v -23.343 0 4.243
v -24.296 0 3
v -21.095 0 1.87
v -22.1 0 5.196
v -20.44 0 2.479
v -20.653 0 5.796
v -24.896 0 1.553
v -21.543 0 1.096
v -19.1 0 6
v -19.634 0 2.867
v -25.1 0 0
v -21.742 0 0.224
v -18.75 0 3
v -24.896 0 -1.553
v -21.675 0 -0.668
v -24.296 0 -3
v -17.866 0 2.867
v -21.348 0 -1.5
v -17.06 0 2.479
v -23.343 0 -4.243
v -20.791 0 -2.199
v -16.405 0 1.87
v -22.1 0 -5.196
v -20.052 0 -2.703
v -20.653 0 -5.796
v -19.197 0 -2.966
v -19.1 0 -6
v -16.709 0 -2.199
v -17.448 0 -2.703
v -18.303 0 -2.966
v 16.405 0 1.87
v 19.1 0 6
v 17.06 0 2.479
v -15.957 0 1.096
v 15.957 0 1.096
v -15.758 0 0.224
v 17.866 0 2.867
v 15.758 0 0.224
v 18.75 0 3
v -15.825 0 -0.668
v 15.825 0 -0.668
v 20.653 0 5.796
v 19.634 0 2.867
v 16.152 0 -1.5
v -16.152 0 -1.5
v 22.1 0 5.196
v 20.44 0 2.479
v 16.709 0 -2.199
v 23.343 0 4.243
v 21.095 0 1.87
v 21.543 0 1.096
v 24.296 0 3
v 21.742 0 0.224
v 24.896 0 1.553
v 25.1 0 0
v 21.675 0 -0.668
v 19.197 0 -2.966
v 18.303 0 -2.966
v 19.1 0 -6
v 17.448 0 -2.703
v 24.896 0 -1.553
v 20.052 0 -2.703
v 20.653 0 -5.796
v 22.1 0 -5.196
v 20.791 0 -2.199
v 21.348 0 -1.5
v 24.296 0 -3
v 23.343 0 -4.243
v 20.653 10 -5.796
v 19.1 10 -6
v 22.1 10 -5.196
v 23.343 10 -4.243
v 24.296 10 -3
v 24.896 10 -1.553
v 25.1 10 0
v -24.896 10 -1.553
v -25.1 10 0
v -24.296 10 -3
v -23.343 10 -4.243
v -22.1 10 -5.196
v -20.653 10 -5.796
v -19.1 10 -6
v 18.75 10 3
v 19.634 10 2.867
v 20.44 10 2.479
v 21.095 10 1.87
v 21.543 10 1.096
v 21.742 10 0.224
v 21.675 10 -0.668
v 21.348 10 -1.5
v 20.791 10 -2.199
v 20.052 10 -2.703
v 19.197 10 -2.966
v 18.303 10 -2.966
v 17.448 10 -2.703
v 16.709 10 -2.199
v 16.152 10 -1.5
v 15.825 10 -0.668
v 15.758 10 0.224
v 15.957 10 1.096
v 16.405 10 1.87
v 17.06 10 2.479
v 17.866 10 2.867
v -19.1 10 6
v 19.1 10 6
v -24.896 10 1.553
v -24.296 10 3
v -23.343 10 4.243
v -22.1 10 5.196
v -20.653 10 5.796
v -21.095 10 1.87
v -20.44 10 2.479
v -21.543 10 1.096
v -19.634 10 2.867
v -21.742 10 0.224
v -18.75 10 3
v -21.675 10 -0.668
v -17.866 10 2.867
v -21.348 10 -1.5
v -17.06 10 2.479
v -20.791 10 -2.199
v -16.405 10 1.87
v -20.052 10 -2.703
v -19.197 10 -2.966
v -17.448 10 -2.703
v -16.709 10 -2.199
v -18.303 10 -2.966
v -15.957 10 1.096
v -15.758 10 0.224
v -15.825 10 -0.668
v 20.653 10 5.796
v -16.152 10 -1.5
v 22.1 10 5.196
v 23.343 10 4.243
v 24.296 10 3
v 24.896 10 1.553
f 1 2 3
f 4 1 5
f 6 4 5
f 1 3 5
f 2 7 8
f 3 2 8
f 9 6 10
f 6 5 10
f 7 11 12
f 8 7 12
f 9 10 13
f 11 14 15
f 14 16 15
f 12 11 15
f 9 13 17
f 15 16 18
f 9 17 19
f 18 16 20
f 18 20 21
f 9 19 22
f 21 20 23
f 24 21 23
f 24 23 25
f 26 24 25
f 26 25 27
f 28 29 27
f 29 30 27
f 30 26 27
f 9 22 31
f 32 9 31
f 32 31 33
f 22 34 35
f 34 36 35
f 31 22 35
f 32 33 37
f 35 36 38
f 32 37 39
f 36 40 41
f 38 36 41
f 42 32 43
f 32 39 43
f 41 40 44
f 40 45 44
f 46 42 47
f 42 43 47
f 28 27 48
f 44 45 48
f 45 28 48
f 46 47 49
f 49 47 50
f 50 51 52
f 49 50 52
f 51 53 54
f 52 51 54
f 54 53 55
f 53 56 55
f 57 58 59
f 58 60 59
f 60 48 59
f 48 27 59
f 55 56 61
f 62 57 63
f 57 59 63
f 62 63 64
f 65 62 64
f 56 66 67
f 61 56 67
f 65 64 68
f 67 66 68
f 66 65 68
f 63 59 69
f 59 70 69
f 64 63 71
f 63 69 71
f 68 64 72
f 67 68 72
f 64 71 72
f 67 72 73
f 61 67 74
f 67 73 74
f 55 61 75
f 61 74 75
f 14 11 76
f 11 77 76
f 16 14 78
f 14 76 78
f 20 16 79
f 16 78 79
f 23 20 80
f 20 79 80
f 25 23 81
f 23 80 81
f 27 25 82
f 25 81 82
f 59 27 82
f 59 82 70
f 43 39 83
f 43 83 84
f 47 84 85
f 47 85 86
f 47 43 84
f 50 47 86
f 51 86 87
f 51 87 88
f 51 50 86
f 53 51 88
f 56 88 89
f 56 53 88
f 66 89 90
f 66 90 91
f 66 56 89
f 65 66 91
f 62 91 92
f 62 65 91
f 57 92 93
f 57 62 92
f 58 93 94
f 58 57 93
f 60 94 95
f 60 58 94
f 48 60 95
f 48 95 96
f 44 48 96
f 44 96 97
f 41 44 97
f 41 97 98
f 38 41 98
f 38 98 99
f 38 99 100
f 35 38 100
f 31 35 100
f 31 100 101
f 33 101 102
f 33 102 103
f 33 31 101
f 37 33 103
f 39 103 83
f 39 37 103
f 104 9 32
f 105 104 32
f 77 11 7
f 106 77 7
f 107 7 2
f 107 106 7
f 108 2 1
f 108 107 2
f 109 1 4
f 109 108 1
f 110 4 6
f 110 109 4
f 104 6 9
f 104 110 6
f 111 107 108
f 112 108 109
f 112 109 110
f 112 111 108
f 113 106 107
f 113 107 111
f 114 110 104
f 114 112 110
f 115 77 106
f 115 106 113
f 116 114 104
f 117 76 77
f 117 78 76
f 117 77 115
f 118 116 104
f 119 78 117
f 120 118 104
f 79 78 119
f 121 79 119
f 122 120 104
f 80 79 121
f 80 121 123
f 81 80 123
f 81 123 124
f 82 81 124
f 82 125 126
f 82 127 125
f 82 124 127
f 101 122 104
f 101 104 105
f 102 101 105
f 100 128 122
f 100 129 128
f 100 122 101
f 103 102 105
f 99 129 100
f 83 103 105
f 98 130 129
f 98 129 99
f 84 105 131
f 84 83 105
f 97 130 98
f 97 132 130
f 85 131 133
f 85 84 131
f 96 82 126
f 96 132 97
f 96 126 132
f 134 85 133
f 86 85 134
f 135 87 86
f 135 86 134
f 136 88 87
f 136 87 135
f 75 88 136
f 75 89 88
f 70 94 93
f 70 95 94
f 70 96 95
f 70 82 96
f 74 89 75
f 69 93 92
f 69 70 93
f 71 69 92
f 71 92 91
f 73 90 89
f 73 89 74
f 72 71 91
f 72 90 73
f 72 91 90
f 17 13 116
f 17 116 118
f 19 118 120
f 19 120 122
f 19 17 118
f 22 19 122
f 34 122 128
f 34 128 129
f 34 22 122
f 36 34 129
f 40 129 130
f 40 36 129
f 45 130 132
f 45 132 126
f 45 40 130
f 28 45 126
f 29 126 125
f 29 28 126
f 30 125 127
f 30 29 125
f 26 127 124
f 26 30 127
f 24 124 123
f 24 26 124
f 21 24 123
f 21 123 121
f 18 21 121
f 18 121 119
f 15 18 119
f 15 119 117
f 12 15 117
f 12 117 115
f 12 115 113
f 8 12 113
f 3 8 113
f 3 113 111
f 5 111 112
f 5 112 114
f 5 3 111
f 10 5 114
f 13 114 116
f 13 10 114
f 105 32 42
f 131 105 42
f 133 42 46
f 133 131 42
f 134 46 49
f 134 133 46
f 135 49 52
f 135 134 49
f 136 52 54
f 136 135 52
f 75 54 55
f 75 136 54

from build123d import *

# Parameters (mm, degrees)
SKETCH1_W           = 50.2
SKETCH1_H           = 12
SKETCH1_R           = 3
BOSS_EXTRUDE1_DEPTH = 10
FILLET1_R           = 6


with BuildPart() as part:
    # Sketch1 → Boss-Extrude1 (new body)
    with BuildSketch(Plane(origin=(0, 0, 0), x_dir=(1, 0, 0), z_dir=(0, 1, 0))):
        Rectangle(SKETCH1_W, SKETCH1_H)
        with Locations(Location((18.75, 0, 0), (0, 0, 270))):
            Circle(SKETCH1_R, mode=Mode.SUBTRACT)
        with Locations(Location((-18.75, 0, 0), (0, 0, 270))):
            Circle(SKETCH1_R, mode=Mode.SUBTRACT)
    extrude(amount=BOSS_EXTRUDE1_DEPTH)

    # Fillet1
    fillet1_edges = [part.edges().sort_by_distance(p)[0] for p in [
        (25.1, 5, -6),
        (25.1, 5, 6),
        (-25.1, 5, -6),
        (-25.1, 5, 6),
    ]]
    fillet(fillet1_edges, radius=FILLET1_R - 0.0001)  # a hair under: the kernel refuses the full size


solid = part.part
